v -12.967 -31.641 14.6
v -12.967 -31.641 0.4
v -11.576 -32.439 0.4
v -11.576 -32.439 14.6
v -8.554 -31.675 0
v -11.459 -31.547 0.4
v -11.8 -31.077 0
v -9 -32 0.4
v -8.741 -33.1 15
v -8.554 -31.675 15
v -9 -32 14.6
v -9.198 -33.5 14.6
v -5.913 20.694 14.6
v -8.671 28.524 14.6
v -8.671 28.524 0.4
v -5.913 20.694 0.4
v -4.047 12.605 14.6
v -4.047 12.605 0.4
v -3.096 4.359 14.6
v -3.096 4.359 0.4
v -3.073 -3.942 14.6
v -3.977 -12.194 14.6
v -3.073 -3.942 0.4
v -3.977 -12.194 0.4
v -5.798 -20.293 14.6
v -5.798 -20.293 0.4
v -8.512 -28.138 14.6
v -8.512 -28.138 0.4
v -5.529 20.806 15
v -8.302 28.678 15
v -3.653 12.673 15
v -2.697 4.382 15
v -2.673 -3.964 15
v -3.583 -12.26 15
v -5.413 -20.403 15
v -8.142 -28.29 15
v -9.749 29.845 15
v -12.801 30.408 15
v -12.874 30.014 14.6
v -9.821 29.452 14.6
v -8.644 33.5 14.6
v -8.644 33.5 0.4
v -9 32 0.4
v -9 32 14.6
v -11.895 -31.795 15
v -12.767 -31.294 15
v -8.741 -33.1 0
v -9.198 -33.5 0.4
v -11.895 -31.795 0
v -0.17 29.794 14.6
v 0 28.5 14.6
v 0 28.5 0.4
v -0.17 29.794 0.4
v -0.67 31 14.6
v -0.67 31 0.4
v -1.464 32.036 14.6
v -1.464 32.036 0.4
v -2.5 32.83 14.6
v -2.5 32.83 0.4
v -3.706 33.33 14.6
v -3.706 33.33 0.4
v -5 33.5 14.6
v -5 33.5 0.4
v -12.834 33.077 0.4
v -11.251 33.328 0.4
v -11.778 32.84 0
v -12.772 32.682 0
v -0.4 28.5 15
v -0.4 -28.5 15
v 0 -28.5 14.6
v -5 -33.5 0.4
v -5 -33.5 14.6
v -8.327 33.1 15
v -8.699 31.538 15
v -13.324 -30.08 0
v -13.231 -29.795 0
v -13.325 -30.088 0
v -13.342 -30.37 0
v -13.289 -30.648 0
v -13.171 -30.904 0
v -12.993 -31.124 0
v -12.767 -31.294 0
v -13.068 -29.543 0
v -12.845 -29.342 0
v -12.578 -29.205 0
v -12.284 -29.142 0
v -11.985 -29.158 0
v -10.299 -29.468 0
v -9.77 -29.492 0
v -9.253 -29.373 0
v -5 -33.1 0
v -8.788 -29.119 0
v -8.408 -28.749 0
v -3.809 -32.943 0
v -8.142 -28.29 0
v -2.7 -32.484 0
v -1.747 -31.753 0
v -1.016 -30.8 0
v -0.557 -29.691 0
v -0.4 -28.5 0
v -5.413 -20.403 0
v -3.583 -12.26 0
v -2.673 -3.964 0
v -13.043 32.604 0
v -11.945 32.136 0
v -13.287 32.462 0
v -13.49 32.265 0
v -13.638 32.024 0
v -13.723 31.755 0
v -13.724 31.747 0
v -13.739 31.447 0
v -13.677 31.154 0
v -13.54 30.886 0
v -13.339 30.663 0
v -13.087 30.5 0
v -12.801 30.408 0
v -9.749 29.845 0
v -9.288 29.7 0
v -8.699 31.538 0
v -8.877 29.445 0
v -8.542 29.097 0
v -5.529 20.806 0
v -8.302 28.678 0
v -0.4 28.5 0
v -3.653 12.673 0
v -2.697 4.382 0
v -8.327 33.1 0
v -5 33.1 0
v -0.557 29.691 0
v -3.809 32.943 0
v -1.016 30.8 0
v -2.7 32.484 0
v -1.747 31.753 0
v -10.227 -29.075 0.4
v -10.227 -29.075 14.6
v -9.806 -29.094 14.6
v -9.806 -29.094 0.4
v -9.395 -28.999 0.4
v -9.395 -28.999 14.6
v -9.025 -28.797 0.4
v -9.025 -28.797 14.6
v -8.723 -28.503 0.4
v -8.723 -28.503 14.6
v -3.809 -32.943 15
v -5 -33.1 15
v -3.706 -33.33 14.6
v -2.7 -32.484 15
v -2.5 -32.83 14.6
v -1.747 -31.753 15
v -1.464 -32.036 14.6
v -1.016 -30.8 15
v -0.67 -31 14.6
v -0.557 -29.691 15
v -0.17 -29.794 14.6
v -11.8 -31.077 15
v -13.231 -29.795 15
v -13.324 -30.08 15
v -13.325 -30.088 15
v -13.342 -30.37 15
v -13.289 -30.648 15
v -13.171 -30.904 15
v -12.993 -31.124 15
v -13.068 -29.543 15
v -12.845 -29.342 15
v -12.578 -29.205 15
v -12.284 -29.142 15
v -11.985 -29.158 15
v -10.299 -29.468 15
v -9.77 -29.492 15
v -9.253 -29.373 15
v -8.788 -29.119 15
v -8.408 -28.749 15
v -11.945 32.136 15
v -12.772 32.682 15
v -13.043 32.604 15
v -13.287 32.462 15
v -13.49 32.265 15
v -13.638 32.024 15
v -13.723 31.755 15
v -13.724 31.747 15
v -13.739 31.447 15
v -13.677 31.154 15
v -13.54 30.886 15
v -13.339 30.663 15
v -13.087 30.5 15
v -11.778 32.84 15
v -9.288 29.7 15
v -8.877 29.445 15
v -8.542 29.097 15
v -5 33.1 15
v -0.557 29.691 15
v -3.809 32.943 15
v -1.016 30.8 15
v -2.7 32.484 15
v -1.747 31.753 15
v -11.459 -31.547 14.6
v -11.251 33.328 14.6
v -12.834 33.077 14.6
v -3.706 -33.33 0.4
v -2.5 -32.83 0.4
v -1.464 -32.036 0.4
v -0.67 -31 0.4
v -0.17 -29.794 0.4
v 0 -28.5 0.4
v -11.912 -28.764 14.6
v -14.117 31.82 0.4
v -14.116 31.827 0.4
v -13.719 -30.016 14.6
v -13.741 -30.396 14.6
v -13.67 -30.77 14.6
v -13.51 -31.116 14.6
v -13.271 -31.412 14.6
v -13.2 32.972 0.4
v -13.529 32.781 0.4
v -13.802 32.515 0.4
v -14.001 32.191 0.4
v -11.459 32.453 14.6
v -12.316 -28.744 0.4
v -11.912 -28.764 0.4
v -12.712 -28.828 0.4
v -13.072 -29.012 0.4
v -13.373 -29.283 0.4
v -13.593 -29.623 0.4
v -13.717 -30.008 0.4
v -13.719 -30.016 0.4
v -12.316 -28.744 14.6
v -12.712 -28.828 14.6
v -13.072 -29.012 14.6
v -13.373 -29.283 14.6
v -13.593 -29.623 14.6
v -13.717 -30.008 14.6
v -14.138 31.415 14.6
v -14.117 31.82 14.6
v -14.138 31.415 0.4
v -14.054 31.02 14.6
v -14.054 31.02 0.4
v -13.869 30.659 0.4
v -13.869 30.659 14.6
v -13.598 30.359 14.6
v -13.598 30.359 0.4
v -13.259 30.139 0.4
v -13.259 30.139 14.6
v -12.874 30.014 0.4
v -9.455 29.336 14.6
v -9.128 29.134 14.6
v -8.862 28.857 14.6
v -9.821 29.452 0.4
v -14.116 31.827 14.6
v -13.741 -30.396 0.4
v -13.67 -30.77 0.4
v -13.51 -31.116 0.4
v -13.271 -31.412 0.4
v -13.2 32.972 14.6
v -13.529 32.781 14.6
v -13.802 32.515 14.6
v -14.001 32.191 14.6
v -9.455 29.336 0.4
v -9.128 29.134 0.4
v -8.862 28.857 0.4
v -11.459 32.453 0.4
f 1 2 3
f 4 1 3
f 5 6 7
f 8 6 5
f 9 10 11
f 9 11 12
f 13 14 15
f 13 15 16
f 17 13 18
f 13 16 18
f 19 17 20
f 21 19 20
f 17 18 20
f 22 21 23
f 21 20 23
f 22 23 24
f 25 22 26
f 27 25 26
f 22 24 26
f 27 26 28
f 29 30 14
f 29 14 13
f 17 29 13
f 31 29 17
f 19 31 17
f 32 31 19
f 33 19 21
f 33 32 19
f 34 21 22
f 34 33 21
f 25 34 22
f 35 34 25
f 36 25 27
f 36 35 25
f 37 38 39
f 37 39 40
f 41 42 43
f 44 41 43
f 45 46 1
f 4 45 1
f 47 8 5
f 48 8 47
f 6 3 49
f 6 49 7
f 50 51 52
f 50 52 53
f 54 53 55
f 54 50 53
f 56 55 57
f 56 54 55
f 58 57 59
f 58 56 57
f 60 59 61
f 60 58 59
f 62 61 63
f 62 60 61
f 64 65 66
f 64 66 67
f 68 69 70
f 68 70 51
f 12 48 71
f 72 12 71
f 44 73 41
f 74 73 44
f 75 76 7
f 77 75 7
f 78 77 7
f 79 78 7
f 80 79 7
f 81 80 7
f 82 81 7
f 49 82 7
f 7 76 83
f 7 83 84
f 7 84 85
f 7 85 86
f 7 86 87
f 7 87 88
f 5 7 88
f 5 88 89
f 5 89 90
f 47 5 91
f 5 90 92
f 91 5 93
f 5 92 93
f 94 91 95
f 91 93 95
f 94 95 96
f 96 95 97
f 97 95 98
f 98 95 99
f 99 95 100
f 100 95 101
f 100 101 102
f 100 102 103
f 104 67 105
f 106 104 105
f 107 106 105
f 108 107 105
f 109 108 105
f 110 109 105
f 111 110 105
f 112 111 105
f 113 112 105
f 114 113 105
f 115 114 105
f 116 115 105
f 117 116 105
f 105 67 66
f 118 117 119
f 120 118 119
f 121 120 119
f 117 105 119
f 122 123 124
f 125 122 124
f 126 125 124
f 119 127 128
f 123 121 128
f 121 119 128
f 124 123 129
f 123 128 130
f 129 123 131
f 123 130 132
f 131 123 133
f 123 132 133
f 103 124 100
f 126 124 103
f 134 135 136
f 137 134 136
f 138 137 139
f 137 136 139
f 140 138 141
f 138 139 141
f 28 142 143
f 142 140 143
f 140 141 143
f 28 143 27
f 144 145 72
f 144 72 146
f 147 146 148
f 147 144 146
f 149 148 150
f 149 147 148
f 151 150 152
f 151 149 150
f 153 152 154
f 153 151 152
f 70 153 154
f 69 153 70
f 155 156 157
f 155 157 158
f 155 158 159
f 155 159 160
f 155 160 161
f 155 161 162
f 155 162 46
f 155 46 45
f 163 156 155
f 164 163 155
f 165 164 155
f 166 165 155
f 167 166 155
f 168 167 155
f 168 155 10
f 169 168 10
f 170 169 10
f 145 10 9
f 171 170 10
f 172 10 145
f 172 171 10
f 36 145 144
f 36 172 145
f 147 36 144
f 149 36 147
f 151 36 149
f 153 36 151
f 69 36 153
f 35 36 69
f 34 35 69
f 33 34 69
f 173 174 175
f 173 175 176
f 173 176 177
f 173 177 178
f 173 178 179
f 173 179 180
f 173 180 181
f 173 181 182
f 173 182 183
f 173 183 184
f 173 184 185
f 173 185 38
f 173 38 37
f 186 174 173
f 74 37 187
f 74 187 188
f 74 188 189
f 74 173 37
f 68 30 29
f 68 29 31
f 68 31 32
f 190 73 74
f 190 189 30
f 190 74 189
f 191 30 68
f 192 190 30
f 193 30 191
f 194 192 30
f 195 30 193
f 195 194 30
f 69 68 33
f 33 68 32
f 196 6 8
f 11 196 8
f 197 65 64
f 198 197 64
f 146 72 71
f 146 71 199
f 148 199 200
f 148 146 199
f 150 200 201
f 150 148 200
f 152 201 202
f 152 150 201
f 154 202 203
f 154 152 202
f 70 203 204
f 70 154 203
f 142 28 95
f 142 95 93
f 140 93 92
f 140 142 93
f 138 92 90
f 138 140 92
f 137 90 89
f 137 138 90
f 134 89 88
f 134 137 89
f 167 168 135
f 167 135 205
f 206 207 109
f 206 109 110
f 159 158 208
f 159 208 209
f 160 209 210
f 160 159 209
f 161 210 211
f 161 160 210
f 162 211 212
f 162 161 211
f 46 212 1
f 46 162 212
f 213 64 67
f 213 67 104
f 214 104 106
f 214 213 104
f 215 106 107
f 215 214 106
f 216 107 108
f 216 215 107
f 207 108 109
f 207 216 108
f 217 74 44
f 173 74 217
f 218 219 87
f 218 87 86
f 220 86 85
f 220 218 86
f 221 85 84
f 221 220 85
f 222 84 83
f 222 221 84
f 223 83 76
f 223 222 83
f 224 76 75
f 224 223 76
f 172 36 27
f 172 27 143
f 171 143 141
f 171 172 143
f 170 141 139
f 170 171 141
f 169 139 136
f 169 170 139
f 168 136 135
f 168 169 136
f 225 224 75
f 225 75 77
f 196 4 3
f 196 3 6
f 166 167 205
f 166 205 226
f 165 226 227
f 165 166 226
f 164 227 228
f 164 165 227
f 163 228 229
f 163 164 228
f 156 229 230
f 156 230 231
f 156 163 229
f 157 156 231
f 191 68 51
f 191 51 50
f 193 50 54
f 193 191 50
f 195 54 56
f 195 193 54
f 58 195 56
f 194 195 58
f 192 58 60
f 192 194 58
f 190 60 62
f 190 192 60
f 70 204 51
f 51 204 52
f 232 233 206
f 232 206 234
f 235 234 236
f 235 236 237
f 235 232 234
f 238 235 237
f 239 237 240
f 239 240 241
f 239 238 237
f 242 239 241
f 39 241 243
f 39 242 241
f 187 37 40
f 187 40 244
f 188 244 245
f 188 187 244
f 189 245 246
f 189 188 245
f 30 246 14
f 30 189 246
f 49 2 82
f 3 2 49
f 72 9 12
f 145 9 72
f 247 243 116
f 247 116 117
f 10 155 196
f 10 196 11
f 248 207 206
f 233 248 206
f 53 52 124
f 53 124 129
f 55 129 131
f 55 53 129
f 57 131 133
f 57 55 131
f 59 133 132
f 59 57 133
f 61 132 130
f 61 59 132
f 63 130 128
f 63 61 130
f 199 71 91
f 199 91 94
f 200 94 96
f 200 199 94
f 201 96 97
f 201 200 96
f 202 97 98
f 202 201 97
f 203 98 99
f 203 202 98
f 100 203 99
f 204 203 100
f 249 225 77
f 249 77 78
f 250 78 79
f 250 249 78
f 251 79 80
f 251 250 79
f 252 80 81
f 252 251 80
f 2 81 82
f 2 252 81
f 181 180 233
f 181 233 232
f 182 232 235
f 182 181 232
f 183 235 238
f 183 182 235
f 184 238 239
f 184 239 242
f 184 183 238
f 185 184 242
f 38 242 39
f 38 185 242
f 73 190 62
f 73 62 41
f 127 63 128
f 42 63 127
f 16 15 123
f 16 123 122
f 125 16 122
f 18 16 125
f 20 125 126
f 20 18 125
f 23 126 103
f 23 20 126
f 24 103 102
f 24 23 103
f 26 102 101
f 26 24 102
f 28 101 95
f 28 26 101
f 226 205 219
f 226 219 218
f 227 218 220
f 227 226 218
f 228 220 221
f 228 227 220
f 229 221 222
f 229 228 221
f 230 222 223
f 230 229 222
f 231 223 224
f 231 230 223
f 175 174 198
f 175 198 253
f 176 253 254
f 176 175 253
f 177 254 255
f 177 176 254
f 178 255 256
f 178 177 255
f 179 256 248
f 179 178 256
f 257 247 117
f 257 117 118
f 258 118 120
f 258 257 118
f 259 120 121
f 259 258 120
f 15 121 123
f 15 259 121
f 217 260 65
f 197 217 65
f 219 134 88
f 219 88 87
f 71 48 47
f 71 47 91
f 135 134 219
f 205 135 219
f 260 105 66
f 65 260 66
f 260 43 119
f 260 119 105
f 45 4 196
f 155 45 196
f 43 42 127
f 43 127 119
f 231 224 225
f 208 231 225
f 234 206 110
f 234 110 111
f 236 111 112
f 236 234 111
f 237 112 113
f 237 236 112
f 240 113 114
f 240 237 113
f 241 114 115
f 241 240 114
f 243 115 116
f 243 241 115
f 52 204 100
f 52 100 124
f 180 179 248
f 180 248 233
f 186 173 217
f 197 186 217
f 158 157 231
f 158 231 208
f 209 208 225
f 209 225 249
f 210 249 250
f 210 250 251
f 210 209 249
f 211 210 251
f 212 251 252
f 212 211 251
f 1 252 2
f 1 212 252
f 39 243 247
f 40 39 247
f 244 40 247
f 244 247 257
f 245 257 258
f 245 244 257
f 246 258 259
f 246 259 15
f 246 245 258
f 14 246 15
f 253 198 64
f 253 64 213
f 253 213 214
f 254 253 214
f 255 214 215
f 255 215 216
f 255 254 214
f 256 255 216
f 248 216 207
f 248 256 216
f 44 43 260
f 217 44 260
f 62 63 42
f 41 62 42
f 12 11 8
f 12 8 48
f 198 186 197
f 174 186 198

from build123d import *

# Parameters (mm, degrees)
F0_W     = 9
F0_H     = 2.69917
F0_H_2   = 1.5
F1_DEPTH = 15
F2_R     = 1.55
F3_R     = 5
F4_SIZE  = 0.4


with BuildPart() as f1:
    # F0 (on Top) → F1 (new body)
    with BuildSketch(Plane.XY):
        Polygon((-9, -32), (-9, -29.30083), (-13.436408, -28.483649), (-13.917276, -31.094244), (-11.458638, -31.547122), align=None)
        with Locations((-4.5, -30.650415)):
            Rectangle(F0_W, F0_H)
        Polygon((-9, -33.5), (-9, -32), (-9.197668, -33.5), align=None)
        with Locations((-4.5, -32.75)):
            Rectangle(F0_W, F0_H_2)
        Polygon((-11.576222, -32.439408), (-11.458638, -31.547122), (-13.917276, -31.094244), align=None)
        with BuildLine():
            Line((0, -29.30083), (0, 29.30083))
            Line((0, 29.30083), (-9, 29.30083))
            ThreePointArc((-9, 29.30083), (-2.96804, 0), (-9, -29.30083))
            Line((-9, -29.30083), (0, -29.30083))
        make_face()
        with Locations((-4.5, 30.650415)):
            Rectangle(F0_W, F0_H)
        Polygon((0, 32), (0, 33.5), (-8.643575, 33.5), (-9, 32), align=None)
        Polygon((-9, 29.30083), (-9, 32), (-11.458638, 32.452878), (-13.917276, 32.905756), (-14.398145, 30.295161), align=None)
        Polygon((-13.917276, 32.905756), (-11.458638, 32.452878), (-11.250576, 33.328498), align=None)
    extrude(amount=F1_DEPTH)

    # F2
    f2_edges = [f1.edges().sort_by_distance(p)[0] for p in [
        (-14.398145, 30.295161, 7.5),
        (-9, 29.30083, 7.5),
        (-13.436408, -28.483649, 7.5),
        (-9, -29.30083, 7.5),
        (-13.917276, -31.094244, 7.5),
        (-13.917276, 32.905756, 7.5),
    ]]
    fillet(f2_edges, radius=F2_R)

    # F3
    f3_edges = [f1.edges().sort_by_distance(p)[0] for p in [
        (0, 33.5, 7.5),
        (0, -33.5, 7.5),
    ]]
    fillet(f3_edges, radius=F3_R)

    # F4
    f4_edges = [f1.edges().sort_by_distance(p)[0] for p in [
        (-7.098834, -33.5, 15),
        (-1.464466, -32.035534, 15),
        (-9.098834, -32.75, 15),
        (0, 0, 15),
        (-10.229319, -31.773561, 15),
        (-1.464466, 32.035534, 15),
        (-11.51743, -31.993265, 15),
        (-6.821787, 33.5, 15),
        (-12.271362, -32.039982, 15),
        (-8.821787, 32.75, 15),
        (-13.60087, -30.94777, 15),
        (-10.229319, 32.226439, 15),
        (-13.717913, -30.011919, 15),
        (-11.354607, 32.890688, 15),
        (-13.072174, -29.012362, 15),
        (-12.042412, 33.202971, 15),
        (-11.069446, -28.91964, 15),
        (-13.673826, 32.656158, 15),
        (-9.203231, -28.9109, 15),
        (-14.116639, 31.823431, 15),
        (-2.968333, 0.208446, 15),
        (-13.869431, 30.659395, 15),
        (-9.128357, 29.133809, 15),
        (-11.347475, 29.733232, 15),
        (-7.098834, -33.5, 0),
        (-1.464466, -32.035534, 0),
        (-9.098834, -32.75, 0),
        (0, 0, 0),
        (-10.229319, -31.773561, 0),
        (-1.464466, 32.035534, 0),
        (-11.51743, -31.993265, 0),
        (-6.821787, 33.5, 0),
        (-12.271362, -32.039982, 0),
        (-8.821787, 32.75, 0),
        (-13.60087, -30.94777, 0),
        (-10.229319, 32.226439, 0),
        (-13.717913, -30.011919, 0),
        (-11.354607, 32.890688, 0),
        (-13.072174, -29.012362, 0),
        (-12.042412, 33.202971, 0),
        (-11.069446, -28.91964, 0),
        (-13.673826, 32.656158, 0),
        (-9.203231, -28.9109, 0),
        (-14.116639, 31.823431, 0),
        (-2.968333, 0.208446, 0),
        (-13.869431, 30.659395, 0),
        (-9.128357, 29.133809, 0),
        (-11.347475, 29.733232, 0),
    ]]
    chamfer(f4_edges, length=F4_SIZE)


solid = f1.part
